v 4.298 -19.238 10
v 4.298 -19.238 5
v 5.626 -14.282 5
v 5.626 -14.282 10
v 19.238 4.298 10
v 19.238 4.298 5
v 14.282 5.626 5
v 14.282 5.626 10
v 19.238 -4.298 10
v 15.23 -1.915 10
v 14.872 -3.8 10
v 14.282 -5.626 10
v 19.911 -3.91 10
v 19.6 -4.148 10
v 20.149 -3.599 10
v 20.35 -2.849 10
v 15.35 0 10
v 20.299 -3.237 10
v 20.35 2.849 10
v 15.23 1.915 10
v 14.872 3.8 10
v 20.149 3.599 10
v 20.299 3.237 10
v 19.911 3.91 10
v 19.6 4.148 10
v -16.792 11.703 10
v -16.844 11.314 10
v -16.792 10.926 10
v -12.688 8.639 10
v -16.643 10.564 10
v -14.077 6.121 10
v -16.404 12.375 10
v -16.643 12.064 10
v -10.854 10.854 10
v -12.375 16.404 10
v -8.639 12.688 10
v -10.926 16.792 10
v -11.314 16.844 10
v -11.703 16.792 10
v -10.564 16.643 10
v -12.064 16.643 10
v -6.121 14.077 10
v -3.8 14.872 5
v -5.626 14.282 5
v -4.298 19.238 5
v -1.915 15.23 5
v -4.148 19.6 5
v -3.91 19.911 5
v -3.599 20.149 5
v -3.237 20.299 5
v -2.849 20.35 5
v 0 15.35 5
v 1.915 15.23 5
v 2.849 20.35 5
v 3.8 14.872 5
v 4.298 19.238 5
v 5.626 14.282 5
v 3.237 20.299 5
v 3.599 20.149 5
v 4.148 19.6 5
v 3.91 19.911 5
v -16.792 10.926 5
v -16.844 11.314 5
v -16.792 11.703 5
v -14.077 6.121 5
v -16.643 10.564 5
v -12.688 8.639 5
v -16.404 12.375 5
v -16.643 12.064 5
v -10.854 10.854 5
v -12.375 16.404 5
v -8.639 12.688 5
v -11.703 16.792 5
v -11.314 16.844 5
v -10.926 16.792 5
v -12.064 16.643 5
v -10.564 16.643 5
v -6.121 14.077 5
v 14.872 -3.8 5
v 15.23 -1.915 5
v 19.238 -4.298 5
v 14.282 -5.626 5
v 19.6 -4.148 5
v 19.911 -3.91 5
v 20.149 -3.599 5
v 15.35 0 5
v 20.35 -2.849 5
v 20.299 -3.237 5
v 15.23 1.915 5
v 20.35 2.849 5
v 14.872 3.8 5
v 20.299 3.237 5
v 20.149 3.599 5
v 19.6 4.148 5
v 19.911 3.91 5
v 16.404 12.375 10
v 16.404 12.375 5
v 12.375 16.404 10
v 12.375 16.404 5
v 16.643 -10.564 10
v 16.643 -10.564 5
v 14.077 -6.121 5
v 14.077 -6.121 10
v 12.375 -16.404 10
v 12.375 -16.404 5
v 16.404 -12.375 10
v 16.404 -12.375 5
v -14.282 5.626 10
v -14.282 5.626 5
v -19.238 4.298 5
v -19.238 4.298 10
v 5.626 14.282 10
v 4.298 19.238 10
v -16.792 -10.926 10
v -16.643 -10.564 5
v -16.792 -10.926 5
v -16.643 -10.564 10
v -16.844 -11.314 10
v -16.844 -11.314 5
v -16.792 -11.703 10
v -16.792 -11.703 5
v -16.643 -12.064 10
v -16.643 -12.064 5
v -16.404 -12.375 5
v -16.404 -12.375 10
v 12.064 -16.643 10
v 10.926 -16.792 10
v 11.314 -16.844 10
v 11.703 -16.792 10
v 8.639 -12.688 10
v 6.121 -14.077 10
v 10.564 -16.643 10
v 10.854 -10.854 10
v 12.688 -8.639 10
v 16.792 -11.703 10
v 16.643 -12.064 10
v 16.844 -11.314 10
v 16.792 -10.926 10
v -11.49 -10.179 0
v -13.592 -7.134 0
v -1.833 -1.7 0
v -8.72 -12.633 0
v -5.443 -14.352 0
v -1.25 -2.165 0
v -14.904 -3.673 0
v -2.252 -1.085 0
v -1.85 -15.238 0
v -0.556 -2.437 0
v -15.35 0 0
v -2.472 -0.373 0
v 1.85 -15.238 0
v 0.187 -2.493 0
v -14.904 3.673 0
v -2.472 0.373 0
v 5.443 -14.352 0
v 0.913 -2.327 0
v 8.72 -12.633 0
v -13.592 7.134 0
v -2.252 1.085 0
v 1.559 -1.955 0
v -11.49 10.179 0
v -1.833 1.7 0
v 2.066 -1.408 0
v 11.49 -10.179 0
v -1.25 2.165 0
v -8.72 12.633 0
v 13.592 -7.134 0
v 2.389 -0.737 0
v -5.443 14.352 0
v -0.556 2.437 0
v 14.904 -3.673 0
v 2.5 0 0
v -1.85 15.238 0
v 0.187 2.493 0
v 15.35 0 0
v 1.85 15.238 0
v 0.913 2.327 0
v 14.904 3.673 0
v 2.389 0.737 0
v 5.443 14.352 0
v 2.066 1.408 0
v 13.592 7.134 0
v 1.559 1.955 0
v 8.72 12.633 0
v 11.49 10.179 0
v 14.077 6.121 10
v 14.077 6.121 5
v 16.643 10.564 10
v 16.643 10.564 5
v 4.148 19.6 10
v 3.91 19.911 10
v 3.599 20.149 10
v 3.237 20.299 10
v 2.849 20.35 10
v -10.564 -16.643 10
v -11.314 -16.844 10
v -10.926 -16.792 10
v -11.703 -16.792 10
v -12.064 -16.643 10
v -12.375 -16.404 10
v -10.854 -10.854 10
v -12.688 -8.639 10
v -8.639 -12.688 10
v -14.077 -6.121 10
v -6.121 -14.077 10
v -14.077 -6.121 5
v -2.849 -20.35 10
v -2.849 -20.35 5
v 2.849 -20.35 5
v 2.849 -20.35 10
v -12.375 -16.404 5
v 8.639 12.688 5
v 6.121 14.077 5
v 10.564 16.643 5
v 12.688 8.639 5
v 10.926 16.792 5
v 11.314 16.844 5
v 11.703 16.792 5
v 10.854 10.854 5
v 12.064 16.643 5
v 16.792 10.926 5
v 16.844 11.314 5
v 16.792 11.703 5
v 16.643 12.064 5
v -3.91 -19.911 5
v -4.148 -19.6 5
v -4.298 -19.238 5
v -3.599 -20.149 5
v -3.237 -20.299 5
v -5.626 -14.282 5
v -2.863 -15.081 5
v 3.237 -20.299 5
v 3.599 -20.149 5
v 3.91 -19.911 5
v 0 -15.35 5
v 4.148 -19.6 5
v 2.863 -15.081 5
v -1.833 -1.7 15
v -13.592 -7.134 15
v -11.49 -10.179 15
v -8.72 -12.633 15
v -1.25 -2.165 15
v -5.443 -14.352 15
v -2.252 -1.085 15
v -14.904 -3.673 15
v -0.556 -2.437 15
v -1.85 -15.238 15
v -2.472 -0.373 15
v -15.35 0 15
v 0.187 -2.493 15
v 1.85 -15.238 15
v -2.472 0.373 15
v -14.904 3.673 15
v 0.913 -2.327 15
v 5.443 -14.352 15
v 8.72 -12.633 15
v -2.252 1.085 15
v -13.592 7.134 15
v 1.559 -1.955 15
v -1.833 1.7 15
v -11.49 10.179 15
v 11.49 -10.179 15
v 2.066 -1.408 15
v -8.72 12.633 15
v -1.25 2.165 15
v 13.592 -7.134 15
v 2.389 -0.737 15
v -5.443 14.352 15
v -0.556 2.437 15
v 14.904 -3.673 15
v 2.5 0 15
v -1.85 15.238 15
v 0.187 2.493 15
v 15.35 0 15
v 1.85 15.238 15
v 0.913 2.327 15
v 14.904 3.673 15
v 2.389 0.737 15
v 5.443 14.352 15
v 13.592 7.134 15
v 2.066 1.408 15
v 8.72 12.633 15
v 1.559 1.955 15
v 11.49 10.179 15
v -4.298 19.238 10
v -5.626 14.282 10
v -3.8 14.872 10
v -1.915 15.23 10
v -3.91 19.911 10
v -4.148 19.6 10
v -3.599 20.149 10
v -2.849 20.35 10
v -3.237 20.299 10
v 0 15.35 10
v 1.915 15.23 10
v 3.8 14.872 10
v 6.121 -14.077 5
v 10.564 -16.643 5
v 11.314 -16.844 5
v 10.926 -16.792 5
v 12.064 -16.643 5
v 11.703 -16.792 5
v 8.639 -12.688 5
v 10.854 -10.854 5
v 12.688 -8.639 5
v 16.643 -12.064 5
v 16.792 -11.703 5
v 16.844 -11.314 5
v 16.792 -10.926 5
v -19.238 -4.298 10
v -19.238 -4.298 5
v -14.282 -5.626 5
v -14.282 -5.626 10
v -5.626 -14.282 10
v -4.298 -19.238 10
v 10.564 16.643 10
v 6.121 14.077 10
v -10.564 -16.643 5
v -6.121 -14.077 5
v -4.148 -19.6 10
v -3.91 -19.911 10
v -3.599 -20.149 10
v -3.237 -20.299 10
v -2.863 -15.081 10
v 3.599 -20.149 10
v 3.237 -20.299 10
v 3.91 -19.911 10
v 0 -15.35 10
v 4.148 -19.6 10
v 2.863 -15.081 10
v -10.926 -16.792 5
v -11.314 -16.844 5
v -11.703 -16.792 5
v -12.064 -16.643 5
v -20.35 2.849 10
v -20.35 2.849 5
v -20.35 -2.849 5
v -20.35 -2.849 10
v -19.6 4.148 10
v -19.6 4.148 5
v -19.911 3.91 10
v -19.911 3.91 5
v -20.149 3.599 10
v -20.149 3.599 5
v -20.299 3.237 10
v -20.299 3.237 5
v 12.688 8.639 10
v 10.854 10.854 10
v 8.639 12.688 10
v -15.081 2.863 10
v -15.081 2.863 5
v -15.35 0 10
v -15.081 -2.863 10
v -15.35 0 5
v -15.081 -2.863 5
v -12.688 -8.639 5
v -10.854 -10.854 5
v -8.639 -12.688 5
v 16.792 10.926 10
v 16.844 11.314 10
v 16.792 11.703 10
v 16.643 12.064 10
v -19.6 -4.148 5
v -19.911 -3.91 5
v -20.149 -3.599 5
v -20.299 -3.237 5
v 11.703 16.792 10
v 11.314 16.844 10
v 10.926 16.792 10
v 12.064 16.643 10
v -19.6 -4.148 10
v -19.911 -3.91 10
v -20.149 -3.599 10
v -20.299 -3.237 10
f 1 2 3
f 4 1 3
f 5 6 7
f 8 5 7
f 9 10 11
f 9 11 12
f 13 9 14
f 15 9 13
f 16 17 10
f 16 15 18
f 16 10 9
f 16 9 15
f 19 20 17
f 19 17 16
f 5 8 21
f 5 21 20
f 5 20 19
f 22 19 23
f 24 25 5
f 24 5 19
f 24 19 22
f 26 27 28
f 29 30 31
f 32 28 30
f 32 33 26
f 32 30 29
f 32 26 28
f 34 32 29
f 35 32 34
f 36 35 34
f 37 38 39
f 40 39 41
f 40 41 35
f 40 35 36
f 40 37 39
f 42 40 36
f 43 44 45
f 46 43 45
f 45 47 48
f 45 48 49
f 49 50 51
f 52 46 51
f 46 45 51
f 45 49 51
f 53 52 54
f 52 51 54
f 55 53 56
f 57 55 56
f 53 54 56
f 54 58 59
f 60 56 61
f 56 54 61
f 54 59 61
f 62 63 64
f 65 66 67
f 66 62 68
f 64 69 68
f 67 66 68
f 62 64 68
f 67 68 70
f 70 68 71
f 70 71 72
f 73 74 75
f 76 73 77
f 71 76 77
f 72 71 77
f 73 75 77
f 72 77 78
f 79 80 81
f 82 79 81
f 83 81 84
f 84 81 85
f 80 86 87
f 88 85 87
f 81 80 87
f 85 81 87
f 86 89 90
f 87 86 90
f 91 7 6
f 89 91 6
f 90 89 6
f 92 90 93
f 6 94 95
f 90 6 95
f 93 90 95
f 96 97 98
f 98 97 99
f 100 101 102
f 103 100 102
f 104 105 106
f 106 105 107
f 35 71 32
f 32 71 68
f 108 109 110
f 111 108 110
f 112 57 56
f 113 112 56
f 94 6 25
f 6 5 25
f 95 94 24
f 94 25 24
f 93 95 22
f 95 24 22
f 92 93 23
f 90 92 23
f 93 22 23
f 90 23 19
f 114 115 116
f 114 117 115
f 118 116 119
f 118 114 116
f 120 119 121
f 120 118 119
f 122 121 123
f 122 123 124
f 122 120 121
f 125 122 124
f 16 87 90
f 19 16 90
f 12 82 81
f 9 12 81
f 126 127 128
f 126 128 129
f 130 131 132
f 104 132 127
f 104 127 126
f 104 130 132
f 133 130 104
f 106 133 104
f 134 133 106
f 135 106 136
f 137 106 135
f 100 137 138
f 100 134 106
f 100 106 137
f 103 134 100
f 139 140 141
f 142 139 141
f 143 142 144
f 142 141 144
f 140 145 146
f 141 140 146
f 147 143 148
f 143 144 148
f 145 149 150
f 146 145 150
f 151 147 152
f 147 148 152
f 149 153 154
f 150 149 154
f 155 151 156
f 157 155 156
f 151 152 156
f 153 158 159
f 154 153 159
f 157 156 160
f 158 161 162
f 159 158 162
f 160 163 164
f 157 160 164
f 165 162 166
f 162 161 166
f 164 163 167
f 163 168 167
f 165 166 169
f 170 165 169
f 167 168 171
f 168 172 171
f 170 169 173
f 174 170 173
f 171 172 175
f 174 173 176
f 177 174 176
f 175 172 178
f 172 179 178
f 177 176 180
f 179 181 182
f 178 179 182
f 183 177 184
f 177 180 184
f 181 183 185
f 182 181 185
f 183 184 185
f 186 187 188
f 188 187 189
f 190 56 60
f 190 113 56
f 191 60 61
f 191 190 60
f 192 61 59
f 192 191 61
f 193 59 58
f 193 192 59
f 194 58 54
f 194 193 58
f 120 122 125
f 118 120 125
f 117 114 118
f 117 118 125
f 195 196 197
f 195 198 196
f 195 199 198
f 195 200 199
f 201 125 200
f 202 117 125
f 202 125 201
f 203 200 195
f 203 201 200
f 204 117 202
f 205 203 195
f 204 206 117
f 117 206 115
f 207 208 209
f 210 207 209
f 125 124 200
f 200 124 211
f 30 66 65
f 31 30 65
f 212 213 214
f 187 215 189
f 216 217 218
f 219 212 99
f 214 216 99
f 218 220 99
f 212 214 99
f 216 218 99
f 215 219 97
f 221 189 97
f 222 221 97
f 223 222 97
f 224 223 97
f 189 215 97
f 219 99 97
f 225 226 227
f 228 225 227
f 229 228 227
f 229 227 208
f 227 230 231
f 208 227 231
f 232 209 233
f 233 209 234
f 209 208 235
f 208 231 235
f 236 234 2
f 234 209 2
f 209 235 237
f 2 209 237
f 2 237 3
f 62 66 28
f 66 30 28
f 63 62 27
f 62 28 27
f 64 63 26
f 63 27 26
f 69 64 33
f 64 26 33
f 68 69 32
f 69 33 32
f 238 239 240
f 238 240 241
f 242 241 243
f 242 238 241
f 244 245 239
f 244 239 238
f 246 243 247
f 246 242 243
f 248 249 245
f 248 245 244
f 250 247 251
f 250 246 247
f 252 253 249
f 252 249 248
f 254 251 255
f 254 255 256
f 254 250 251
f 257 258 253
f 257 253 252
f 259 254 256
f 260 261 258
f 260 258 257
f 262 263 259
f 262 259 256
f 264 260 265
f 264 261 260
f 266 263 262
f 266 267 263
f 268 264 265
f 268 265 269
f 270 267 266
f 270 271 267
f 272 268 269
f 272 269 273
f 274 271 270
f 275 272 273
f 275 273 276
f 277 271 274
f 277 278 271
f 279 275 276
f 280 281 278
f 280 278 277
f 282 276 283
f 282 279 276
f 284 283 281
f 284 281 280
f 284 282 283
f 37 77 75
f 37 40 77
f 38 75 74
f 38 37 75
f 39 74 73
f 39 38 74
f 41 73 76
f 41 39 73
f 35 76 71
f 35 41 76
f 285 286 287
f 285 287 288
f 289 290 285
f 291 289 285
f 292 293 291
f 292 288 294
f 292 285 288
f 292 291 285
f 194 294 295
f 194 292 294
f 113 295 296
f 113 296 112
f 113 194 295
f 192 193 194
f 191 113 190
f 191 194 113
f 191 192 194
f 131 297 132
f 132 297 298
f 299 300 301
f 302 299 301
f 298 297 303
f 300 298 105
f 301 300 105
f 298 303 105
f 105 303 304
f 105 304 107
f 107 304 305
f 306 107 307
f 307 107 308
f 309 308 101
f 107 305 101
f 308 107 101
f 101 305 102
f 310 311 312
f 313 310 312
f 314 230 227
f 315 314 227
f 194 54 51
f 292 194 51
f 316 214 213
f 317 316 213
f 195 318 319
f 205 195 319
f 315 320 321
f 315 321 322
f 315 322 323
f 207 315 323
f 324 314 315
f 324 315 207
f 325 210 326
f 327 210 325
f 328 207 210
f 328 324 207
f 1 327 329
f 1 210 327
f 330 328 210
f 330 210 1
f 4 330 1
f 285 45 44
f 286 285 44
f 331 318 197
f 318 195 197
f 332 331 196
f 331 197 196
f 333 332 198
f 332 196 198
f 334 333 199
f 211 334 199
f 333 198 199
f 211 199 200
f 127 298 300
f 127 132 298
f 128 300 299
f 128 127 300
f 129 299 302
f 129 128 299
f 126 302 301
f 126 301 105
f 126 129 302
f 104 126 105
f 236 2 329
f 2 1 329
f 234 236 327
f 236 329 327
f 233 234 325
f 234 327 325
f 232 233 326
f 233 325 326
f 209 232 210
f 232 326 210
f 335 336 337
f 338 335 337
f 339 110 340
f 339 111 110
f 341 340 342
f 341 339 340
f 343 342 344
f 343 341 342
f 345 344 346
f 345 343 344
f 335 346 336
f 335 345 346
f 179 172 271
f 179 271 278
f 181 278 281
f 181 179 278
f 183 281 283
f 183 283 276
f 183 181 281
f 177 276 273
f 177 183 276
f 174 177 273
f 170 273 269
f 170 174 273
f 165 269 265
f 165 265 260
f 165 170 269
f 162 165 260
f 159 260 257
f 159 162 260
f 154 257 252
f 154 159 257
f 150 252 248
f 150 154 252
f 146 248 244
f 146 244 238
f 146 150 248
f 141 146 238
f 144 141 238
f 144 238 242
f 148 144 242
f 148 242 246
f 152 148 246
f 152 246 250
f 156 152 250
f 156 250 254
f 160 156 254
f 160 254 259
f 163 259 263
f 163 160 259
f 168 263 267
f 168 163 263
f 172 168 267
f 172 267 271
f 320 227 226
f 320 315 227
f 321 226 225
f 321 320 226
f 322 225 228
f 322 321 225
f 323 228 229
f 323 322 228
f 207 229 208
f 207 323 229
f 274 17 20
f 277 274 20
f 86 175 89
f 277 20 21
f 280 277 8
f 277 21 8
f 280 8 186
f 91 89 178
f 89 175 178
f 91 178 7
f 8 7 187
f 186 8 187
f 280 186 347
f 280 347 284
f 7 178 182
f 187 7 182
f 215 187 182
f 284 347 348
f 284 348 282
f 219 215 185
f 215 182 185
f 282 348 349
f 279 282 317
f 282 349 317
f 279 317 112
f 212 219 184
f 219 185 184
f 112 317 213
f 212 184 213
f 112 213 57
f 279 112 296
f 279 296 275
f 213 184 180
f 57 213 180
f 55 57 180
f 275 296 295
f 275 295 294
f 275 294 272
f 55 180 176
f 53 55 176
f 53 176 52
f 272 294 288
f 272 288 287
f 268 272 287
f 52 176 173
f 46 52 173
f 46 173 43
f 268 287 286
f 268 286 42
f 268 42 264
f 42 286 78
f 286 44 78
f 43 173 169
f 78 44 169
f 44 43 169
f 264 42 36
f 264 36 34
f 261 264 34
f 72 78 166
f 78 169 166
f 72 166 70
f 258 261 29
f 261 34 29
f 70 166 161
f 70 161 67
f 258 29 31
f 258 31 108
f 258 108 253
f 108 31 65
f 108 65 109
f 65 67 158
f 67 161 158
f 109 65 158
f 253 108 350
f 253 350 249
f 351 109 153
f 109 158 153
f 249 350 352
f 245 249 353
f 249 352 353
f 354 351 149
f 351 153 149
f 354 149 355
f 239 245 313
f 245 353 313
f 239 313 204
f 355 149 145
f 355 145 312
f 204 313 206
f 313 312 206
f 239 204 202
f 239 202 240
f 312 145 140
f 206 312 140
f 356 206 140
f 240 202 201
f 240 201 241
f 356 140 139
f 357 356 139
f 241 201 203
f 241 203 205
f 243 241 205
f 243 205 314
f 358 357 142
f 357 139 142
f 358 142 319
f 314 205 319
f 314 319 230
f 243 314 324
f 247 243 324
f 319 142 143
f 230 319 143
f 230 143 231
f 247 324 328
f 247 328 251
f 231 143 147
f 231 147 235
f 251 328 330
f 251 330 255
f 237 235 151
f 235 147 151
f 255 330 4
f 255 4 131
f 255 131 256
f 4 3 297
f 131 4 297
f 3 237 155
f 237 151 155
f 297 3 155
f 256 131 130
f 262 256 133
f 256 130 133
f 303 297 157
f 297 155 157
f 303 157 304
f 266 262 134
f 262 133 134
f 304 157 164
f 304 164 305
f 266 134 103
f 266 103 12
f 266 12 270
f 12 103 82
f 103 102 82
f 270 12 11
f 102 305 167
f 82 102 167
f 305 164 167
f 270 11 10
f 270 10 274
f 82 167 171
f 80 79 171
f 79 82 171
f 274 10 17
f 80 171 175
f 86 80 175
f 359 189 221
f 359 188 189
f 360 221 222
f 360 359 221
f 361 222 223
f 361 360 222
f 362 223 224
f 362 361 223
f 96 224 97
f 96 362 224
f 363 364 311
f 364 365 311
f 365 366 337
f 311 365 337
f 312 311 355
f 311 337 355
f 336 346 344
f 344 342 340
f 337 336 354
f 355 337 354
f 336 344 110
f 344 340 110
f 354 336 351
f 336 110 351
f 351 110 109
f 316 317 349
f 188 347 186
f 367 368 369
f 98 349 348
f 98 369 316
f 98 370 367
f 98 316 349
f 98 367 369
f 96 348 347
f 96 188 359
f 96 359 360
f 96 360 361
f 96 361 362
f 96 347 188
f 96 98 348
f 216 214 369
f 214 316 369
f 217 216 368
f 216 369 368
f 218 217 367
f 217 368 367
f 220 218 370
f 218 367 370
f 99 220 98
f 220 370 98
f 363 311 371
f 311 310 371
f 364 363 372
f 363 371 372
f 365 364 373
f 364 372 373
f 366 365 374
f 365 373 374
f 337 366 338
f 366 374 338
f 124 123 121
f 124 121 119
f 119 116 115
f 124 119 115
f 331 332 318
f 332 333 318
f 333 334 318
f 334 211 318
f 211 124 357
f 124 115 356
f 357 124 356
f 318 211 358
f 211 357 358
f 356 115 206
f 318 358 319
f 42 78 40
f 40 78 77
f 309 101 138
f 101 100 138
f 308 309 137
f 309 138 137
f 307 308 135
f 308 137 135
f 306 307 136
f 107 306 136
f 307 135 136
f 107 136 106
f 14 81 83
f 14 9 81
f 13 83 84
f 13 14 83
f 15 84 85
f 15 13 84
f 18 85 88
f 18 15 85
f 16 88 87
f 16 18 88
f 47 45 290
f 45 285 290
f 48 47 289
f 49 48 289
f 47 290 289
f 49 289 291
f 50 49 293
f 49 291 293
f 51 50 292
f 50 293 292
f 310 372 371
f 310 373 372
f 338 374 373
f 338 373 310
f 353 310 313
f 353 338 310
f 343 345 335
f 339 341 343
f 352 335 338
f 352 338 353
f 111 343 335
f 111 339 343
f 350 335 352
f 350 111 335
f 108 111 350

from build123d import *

# Parameters (mm, degrees)
SKETCH_1_R      = 15.35
SKETCH_1_R_2    = 2.5
EXTRUDE_1_DEPTH = 15
EXTRUDE_START   = 5
EXTRUDE_2_DEPTH = 5
FILLET_1_R      = 1.5


with BuildPart() as part:
    # 草图1 → 凸台-拉伸1 (new body)
    with BuildSketch(Plane.XY):
        Circle(SKETCH_1_R)
        Circle(SKETCH_1_R_2, mode=Mode.SUBTRACT)
    extrude(amount=EXTRUDE_1_DEPTH)

    # 草图1<3> → 凸台-拉伸2 (add)
    with BuildSketch(Plane.XY.offset(EXTRUDE_START)):
        with BuildLine():
            Line((-4, 20.35), (-5.625957141, 14.281845337))
            ThreePointArc((-5.625957141, 14.281845337), (0, 15.35), (5.625957141, 14.281845337))
            Line((5.625957141, 14.281845337), (4, 20.35))
            Line((4, 20.35), (-4, 20.35))
        make_face()
        with BuildLine():
            ThreePointArc((-14.076942131, 6.120637241), (-10.854089091, 10.854089091), (-6.120637241, 14.076942131))
            Line((-6.120637241, 14.076942131), (-11.561195872, 17.218050122))
            Line((-11.561195872, 17.218050122), (-17.218050122, 11.561195872))
            Line((-17.218050122, 11.561195872), (-14.076942131, 6.120637241))
        make_face()
        with BuildLine():
            ThreePointArc((-14.281845337, -5.625957141), (-15.35, 0), (-14.281845337, 5.625957141))
            Line((-14.281845337, 5.625957141), (-20.35, 4))
            Line((-20.35, 4), (-20.35, -4))
            Line((-20.35, -4), (-14.281845337, -5.625957141))
        make_face()
        with BuildLine():
            Line((11.561195872, 17.218050122), (6.120637241, 14.076942131))
            ThreePointArc((6.120637241, 14.076942131), (10.854089091, 10.854089091), (14.076942131, 6.120637241))
            Line((14.076942131, 6.120637241), (17.218050122, 11.561195872))
            Line((17.218050122, 11.561195872), (11.561195872, 17.218050122))
        make_face()
        with BuildLine():
            ThreePointArc((-6.120637241, -14.076942131), (-10.854089091, -10.854089091), (-14.076942131, -6.120637241))
            Line((-14.076942131, -6.120637241), (-17.218050122, -11.561195872))
            Line((-17.218050122, -11.561195872), (-11.561195872, -17.218050122))
            Line((-11.561195872, -17.218050122), (-6.120637241, -14.076942131))
        make_face()
        with BuildLine():
            Line((20.35, 4), (14.281845337, 5.625957141))
            ThreePointArc((14.281845337, 5.625957141), (15.35, 0), (14.281845337, -5.625957141))
            Line((14.281845337, -5.625957141), (20.35, -4))
            Line((20.35, -4), (20.35, 4))
        make_face()
        with BuildLine():
            ThreePointArc((5.625957141, -14.281845337), (0, -15.35), (-5.625957141, -14.281845337))
            Line((-5.625957141, -14.281845337), (-4, -20.35))
            Line((-4, -20.35), (4, -20.35))
            Line((4, -20.35), (5.625957141, -14.281845337))
        make_face()
        with BuildLine():
            Line((17.218050122, -11.561195872), (14.076942131, -6.120637241))
            ThreePointArc((14.076942131, -6.120637241), (10.854089091, -10.854089091), (6.120637241, -14.076942131))
            Line((6.120637241, -14.076942131), (11.561195872, -17.218050122))
            Line((11.561195872, -17.218050122), (17.218050122, -11.561195872))
        make_face()
    extrude(amount=EXTRUDE_2_DEPTH)

    # 圆角1
    fillet_1_edges = [part.edges().sort_by_distance(p)[0] for p in [
        (-11.561195872, 17.218050122, 7.5),
        (-17.218050122, 11.561195872, 7.5),
        (-20.35, 4, 7.5),
        (-20.35, -4, 7.5),
        (-17.218050122, -11.561195872, 7.5),
        (-11.561195872, -17.218050122, 7.5),
        (-4, -20.35, 7.5),
        (4, -20.35, 7.5),
        (11.561195872, -17.218050122, 7.5),
        (17.218050122, -11.561195872, 7.5),
        (20.35, -4, 7.5),
        (20.35, 4, 7.5),
        (17.218050122, 11.561195872, 7.5),
        (11.561195872, 17.218050122, 7.5),
        (4, 20.35, 7.5),
        (-4, 20.35, 7.5),
    ]]
    fillet(fillet_1_edges, radius=FILLET_1_R)


solid = part.part
